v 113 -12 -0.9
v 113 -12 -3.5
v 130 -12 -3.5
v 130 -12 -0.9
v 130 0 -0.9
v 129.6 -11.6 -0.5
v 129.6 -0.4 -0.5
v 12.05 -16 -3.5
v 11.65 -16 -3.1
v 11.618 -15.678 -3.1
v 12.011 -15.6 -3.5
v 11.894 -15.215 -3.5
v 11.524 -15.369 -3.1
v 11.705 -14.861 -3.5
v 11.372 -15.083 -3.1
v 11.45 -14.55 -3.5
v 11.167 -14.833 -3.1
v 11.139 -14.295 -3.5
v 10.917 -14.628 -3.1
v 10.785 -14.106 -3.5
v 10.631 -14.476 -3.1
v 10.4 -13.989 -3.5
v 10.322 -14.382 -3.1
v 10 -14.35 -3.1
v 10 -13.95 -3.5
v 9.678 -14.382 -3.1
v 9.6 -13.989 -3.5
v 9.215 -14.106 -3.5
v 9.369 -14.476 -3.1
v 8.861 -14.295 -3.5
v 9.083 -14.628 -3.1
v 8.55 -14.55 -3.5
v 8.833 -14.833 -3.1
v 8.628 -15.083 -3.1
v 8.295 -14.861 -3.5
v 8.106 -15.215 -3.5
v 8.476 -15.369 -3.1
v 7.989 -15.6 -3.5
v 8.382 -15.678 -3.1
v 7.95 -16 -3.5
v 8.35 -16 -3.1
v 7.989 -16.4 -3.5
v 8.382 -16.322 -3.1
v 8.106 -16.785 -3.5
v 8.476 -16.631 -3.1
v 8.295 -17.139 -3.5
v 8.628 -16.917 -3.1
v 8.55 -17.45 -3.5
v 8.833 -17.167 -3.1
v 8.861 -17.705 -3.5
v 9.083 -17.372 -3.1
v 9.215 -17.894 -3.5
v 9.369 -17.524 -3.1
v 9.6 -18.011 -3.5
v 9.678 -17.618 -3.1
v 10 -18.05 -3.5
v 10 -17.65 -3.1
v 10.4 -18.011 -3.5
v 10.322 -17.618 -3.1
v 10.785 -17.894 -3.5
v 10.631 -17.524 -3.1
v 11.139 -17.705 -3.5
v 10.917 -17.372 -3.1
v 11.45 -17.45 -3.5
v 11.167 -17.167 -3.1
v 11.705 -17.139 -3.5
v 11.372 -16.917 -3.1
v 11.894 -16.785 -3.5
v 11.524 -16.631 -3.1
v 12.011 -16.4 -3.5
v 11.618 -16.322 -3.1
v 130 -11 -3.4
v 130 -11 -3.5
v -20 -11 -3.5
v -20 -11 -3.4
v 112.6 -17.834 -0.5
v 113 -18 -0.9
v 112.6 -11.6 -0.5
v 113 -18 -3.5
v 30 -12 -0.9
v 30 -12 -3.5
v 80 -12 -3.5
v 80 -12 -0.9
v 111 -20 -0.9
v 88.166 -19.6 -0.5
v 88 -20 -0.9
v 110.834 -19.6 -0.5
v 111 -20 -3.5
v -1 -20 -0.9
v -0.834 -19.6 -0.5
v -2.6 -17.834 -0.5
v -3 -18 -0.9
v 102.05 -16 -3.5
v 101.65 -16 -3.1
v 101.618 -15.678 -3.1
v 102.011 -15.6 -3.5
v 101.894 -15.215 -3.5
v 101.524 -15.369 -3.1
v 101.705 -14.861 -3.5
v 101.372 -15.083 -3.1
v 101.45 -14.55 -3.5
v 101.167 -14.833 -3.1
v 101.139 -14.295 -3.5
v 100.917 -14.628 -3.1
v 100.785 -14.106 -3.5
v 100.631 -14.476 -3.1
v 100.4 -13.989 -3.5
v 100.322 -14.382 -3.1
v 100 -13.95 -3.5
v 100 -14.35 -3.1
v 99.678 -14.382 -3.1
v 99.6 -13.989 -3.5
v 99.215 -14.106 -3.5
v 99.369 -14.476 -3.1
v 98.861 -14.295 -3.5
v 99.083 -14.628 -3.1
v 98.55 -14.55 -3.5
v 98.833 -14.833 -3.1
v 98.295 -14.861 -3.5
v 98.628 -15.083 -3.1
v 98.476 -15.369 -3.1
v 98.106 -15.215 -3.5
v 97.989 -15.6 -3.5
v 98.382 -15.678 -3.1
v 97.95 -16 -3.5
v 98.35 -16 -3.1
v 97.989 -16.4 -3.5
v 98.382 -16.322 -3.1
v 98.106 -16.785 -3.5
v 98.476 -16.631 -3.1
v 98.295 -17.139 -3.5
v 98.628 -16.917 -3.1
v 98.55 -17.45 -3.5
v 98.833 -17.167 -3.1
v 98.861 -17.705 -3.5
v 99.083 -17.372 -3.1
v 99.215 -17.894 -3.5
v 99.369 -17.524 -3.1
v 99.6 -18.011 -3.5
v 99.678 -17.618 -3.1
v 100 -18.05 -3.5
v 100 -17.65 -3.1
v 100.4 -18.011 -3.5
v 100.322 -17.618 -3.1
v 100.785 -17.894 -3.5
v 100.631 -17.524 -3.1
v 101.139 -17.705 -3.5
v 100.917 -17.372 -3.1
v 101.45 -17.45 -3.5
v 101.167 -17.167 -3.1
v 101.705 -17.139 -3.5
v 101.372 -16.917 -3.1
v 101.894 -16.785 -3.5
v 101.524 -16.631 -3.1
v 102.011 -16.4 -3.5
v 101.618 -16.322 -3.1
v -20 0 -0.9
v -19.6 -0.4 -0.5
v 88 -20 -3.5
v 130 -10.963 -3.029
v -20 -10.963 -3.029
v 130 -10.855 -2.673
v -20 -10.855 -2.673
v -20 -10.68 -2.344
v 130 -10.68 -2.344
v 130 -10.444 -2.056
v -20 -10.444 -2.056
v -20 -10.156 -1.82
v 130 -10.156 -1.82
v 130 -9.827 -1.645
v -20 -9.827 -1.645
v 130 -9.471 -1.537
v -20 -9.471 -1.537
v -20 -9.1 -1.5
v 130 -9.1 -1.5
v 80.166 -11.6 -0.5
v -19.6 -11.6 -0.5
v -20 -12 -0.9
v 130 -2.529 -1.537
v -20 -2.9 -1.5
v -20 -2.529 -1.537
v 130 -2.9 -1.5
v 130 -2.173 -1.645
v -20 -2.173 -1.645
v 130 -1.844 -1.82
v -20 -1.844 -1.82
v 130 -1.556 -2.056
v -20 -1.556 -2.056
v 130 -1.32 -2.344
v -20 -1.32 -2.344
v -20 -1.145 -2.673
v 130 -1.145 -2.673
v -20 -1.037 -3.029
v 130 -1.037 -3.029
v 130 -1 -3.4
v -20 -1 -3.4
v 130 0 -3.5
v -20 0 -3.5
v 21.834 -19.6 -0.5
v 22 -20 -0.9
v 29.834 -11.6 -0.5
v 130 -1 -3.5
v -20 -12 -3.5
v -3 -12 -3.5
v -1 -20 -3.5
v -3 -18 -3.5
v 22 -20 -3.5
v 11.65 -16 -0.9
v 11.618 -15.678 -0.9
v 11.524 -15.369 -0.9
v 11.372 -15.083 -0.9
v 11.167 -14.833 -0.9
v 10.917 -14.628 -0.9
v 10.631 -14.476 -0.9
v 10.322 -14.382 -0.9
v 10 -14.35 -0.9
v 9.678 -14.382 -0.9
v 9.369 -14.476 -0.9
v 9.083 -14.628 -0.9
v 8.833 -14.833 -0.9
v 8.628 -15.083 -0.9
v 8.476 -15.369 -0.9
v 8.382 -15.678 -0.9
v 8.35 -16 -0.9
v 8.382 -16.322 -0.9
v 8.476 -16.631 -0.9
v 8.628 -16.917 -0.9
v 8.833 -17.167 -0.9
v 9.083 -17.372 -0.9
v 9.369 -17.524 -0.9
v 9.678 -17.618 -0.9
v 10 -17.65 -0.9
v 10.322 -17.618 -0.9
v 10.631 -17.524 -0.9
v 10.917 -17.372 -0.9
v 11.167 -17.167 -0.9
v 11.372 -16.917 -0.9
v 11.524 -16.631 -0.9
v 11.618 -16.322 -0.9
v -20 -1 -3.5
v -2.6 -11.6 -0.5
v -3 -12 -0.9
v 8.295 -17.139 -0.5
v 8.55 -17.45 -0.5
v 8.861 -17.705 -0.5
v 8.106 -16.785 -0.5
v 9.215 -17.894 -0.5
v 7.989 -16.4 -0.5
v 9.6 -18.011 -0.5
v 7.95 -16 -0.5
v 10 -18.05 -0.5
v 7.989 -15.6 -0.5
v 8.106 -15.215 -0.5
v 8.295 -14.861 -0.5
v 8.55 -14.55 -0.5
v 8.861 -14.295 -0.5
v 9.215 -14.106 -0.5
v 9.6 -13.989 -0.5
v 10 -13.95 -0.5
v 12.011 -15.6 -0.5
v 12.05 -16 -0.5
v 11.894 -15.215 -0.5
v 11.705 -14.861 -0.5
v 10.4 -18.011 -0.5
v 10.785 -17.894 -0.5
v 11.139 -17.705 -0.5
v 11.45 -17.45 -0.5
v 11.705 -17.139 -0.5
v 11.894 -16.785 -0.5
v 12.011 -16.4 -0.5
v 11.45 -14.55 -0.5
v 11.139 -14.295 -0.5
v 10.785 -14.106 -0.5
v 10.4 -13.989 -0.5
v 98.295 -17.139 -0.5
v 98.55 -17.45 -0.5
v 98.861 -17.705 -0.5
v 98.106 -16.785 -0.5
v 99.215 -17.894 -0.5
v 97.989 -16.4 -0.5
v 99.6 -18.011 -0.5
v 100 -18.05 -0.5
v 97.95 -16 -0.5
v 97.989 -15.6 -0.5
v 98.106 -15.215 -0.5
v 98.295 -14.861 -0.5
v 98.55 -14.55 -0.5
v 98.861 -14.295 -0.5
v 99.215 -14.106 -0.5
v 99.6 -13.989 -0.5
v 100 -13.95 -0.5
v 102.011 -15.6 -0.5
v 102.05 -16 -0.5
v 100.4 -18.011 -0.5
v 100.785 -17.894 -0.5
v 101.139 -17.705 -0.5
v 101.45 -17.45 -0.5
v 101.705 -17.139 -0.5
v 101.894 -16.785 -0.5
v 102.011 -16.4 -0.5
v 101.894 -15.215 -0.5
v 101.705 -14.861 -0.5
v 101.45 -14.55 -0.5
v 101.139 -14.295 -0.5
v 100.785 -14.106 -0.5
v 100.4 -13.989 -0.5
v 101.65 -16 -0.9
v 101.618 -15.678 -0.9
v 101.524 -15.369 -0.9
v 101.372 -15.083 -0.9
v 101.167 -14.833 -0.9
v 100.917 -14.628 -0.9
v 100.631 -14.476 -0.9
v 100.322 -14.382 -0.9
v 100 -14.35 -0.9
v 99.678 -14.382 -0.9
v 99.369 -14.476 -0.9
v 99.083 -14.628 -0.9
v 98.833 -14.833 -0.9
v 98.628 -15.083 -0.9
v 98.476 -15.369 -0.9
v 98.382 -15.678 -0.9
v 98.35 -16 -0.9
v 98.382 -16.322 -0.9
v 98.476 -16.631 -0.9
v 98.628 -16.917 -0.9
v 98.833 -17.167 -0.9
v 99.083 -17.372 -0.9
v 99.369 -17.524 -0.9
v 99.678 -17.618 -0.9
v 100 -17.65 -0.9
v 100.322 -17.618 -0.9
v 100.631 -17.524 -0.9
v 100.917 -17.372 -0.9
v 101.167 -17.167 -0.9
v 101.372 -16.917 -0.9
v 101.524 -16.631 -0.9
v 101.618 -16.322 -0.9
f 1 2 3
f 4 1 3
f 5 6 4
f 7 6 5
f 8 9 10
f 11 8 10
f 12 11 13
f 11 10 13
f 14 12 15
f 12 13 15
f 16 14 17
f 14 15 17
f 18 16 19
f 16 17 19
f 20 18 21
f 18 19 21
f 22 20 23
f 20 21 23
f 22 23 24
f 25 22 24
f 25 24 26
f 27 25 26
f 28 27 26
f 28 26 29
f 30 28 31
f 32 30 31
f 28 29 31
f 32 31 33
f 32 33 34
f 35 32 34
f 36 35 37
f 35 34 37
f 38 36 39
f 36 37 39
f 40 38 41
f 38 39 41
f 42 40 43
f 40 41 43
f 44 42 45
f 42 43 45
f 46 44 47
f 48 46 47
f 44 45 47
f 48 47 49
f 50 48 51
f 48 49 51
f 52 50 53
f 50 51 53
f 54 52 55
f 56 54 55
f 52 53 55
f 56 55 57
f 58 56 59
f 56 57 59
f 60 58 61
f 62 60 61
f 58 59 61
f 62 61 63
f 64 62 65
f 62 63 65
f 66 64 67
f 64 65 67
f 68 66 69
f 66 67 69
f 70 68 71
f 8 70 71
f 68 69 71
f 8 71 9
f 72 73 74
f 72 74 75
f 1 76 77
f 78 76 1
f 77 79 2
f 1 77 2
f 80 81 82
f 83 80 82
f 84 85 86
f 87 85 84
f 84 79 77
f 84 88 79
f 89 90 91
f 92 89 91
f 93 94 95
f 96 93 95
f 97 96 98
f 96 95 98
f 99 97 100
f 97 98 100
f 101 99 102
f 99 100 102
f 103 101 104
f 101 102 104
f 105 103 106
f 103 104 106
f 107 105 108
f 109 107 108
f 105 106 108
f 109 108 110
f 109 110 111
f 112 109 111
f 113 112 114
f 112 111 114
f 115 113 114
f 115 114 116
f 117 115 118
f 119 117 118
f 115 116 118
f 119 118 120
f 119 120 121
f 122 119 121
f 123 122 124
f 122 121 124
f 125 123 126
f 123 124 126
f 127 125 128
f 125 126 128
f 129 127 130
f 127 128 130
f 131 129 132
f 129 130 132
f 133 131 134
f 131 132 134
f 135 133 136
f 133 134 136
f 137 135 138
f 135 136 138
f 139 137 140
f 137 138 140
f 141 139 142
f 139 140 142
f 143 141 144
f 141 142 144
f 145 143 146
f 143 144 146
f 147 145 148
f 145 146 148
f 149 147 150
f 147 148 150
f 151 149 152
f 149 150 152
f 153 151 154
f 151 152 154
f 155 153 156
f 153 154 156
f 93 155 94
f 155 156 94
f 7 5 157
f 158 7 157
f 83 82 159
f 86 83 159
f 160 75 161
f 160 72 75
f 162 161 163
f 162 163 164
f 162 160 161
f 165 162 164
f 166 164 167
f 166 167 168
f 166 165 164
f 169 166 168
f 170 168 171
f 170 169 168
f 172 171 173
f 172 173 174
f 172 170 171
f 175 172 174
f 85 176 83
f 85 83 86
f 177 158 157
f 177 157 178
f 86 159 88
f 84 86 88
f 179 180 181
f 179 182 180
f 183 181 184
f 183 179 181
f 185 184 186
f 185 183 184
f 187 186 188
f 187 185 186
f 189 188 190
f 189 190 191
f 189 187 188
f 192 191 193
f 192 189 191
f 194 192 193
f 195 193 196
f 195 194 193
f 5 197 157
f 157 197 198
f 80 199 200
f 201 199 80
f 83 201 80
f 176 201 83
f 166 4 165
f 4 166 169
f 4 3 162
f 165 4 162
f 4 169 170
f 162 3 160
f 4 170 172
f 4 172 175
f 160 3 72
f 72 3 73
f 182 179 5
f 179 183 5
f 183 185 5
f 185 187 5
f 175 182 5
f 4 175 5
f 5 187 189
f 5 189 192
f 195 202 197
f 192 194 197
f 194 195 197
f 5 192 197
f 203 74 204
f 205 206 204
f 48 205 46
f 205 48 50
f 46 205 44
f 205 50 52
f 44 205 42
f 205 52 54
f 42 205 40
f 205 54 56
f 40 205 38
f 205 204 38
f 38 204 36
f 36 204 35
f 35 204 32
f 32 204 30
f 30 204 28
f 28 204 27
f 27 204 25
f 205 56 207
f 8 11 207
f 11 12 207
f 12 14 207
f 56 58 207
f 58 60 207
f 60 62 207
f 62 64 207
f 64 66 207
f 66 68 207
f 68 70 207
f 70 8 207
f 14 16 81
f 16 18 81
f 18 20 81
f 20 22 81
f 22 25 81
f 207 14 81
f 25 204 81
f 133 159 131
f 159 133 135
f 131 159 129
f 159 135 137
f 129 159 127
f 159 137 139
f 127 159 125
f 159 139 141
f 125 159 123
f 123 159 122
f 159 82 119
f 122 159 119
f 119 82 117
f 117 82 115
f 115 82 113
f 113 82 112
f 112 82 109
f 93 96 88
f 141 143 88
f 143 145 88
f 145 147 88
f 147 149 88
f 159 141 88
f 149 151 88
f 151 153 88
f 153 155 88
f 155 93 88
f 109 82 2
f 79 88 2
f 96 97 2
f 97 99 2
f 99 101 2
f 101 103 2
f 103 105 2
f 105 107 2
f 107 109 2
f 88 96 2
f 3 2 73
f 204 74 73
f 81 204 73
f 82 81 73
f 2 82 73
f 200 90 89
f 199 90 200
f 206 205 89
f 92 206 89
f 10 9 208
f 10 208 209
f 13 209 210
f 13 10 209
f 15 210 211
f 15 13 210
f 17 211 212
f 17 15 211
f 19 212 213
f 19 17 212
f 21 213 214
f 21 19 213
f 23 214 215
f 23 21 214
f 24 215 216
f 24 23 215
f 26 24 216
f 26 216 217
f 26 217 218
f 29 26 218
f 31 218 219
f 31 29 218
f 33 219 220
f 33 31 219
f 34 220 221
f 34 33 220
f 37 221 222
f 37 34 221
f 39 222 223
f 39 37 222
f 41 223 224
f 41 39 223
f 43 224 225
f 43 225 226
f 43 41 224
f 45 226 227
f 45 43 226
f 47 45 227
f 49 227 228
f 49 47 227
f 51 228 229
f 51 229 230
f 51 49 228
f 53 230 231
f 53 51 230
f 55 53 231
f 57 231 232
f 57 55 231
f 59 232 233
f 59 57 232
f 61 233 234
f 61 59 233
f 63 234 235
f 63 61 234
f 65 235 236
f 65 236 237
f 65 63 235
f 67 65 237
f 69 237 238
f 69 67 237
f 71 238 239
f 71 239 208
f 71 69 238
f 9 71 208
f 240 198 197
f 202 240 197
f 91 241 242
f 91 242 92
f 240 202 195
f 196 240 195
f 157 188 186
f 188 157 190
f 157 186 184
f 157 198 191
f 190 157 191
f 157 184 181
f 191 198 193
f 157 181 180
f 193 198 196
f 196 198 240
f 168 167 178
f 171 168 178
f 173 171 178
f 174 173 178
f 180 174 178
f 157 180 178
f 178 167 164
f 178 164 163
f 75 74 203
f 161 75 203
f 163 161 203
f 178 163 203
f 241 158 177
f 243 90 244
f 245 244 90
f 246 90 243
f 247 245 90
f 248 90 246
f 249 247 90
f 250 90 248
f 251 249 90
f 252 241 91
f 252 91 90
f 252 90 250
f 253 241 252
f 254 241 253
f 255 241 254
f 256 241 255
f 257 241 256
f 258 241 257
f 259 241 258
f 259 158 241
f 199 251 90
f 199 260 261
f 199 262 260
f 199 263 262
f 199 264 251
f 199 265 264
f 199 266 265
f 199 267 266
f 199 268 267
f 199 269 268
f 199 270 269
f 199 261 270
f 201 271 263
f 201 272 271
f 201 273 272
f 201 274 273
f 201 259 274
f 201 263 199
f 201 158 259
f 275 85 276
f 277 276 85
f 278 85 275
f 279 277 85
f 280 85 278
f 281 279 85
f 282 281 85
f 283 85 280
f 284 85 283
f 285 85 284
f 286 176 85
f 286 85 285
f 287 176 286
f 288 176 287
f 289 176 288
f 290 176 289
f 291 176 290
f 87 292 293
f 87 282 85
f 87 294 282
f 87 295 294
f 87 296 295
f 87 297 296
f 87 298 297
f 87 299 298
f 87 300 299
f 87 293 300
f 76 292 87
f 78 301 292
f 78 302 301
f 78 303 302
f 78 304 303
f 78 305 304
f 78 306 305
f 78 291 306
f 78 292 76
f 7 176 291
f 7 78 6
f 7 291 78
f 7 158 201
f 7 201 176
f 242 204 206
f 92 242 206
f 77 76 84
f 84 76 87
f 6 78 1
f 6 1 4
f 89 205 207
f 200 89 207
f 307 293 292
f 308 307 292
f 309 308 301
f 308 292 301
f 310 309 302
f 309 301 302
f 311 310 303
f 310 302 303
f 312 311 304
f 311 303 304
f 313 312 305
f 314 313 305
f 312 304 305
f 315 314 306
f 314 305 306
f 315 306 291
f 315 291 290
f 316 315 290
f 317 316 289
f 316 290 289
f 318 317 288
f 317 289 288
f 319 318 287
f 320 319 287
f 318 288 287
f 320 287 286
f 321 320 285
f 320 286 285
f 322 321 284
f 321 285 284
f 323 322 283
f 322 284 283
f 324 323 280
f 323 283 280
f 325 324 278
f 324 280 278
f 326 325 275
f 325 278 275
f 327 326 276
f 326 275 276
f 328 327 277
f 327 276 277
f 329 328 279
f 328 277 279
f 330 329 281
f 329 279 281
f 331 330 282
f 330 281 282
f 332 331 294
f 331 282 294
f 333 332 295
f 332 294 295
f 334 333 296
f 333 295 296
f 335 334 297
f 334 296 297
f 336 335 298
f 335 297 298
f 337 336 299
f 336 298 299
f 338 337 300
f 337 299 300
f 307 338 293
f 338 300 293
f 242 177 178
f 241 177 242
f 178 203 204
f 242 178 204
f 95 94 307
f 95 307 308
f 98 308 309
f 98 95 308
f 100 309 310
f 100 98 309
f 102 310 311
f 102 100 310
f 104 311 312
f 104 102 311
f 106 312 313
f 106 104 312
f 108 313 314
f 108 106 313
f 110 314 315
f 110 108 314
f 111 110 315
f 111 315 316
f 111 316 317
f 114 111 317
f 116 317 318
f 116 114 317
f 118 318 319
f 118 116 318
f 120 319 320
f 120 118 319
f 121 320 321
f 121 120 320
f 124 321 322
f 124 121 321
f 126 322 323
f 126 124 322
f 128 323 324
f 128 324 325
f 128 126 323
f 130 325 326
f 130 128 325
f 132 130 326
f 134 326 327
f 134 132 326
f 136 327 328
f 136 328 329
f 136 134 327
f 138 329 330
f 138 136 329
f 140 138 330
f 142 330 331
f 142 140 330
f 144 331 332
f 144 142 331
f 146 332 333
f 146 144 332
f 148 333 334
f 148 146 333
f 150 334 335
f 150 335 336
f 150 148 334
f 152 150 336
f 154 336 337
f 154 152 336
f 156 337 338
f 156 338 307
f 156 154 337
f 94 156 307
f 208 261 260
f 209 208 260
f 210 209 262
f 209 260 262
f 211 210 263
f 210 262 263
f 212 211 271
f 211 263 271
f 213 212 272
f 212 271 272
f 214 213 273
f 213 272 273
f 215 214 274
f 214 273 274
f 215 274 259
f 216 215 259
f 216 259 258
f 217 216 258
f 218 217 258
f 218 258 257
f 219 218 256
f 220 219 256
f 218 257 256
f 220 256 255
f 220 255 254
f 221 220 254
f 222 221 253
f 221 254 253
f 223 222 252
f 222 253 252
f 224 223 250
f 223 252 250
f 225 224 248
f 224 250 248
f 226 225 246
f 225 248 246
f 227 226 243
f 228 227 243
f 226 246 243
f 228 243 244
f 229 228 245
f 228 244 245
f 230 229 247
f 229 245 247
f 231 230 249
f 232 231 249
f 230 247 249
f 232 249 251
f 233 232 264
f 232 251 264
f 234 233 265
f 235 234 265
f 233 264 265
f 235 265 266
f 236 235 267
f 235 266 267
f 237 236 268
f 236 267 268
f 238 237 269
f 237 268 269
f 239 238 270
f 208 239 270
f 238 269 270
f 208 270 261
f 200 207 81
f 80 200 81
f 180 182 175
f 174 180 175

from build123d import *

# Parameters (mm, degrees)
SKETCH011_R     = 1.65
PAD005_DEPTH    = 3
SKETCH012_W     = 10
SKETCH012_H     = 2
POCKET007_DEPTH = 150.001
FILLET002_R     = 1.9
CHAMFER009_SIZE = 2
CHAMFER010_SIZE = 0.4


with BuildPart() as part:
    # Sketch011 (on Face1 of CopyChamfer008) → Pad005 (new body)
    with BuildSketch(Plane.XY.offset(-3.5)):
        Polygon((130, 0), (-20, 0), (-20, -12), (-3, -12), (-3, -20), (22, -20), (30, -12), (80, -12), (88, -20), (113, -20), (113, -12), (130, -12), align=None)
        with Locations((10, -16)):
            Circle(SKETCH011_R, mode=Mode.SUBTRACT)
        with Locations((100, -16)):
            Circle(SKETCH011_R, mode=Mode.SUBTRACT)
    extrude(amount=PAD005_DEPTH)

    # Sketch012 (on Face2 of Pad005) → Pocket007 (cut, through all)
    with BuildSketch(Plane(origin=(-20, 0, 0), x_dir=(0, -1, 0), z_dir=(-1, 0, 0))):
        with Locations((6, -2.5)):
            Rectangle(SKETCH012_W, SKETCH012_H)
    extrude(amount=-POCKET007_DEPTH, mode=Mode.SUBTRACT)

    # Fillet002
    fillet002_edges = [part.edges().sort_by_distance(p)[0] for p in [
        (55, -1, -1.5),
        (55, -11, -1.5),
    ]]
    fillet(fillet002_edges, radius=FILLET002_R)

    # Chamfer009
    chamfer009_edges = [part.edges().sort_by_distance(p)[0] for p in [
        (-3, -20, -2),
        (113, -20, -2),
    ]]
    chamfer(chamfer009_edges, length=CHAMFER009_SIZE)

    # Chamfer010
    chamfer010_edges = [part.edges().sort_by_distance(p)[0] for p in [
        (-3, -15, -0.5),
        (-2, -19, -0.5),
        (-11.5, -12, -0.5),
        (10.5, -20, -0.5),
        (-20, -6, -0.5),
        (26, -16, -0.5),
        (55, 0, -0.5),
        (55, -12, -0.5),
        (130, -6, -0.5),
        (84, -16, -0.5),
        (121.5, -12, -0.5),
        (99.5, -20, -0.5),
        (113, -15, -0.5),
        (112, -19, -0.5),
        (8.35, -16, -0.5),
        (98.35, -16, -0.5),
        (8.35, -16, -3.5),
        (98.35, -16, -3.5),
    ]]
    chamfer(chamfer010_edges, length=CHAMFER010_SIZE)


solid = part.part
